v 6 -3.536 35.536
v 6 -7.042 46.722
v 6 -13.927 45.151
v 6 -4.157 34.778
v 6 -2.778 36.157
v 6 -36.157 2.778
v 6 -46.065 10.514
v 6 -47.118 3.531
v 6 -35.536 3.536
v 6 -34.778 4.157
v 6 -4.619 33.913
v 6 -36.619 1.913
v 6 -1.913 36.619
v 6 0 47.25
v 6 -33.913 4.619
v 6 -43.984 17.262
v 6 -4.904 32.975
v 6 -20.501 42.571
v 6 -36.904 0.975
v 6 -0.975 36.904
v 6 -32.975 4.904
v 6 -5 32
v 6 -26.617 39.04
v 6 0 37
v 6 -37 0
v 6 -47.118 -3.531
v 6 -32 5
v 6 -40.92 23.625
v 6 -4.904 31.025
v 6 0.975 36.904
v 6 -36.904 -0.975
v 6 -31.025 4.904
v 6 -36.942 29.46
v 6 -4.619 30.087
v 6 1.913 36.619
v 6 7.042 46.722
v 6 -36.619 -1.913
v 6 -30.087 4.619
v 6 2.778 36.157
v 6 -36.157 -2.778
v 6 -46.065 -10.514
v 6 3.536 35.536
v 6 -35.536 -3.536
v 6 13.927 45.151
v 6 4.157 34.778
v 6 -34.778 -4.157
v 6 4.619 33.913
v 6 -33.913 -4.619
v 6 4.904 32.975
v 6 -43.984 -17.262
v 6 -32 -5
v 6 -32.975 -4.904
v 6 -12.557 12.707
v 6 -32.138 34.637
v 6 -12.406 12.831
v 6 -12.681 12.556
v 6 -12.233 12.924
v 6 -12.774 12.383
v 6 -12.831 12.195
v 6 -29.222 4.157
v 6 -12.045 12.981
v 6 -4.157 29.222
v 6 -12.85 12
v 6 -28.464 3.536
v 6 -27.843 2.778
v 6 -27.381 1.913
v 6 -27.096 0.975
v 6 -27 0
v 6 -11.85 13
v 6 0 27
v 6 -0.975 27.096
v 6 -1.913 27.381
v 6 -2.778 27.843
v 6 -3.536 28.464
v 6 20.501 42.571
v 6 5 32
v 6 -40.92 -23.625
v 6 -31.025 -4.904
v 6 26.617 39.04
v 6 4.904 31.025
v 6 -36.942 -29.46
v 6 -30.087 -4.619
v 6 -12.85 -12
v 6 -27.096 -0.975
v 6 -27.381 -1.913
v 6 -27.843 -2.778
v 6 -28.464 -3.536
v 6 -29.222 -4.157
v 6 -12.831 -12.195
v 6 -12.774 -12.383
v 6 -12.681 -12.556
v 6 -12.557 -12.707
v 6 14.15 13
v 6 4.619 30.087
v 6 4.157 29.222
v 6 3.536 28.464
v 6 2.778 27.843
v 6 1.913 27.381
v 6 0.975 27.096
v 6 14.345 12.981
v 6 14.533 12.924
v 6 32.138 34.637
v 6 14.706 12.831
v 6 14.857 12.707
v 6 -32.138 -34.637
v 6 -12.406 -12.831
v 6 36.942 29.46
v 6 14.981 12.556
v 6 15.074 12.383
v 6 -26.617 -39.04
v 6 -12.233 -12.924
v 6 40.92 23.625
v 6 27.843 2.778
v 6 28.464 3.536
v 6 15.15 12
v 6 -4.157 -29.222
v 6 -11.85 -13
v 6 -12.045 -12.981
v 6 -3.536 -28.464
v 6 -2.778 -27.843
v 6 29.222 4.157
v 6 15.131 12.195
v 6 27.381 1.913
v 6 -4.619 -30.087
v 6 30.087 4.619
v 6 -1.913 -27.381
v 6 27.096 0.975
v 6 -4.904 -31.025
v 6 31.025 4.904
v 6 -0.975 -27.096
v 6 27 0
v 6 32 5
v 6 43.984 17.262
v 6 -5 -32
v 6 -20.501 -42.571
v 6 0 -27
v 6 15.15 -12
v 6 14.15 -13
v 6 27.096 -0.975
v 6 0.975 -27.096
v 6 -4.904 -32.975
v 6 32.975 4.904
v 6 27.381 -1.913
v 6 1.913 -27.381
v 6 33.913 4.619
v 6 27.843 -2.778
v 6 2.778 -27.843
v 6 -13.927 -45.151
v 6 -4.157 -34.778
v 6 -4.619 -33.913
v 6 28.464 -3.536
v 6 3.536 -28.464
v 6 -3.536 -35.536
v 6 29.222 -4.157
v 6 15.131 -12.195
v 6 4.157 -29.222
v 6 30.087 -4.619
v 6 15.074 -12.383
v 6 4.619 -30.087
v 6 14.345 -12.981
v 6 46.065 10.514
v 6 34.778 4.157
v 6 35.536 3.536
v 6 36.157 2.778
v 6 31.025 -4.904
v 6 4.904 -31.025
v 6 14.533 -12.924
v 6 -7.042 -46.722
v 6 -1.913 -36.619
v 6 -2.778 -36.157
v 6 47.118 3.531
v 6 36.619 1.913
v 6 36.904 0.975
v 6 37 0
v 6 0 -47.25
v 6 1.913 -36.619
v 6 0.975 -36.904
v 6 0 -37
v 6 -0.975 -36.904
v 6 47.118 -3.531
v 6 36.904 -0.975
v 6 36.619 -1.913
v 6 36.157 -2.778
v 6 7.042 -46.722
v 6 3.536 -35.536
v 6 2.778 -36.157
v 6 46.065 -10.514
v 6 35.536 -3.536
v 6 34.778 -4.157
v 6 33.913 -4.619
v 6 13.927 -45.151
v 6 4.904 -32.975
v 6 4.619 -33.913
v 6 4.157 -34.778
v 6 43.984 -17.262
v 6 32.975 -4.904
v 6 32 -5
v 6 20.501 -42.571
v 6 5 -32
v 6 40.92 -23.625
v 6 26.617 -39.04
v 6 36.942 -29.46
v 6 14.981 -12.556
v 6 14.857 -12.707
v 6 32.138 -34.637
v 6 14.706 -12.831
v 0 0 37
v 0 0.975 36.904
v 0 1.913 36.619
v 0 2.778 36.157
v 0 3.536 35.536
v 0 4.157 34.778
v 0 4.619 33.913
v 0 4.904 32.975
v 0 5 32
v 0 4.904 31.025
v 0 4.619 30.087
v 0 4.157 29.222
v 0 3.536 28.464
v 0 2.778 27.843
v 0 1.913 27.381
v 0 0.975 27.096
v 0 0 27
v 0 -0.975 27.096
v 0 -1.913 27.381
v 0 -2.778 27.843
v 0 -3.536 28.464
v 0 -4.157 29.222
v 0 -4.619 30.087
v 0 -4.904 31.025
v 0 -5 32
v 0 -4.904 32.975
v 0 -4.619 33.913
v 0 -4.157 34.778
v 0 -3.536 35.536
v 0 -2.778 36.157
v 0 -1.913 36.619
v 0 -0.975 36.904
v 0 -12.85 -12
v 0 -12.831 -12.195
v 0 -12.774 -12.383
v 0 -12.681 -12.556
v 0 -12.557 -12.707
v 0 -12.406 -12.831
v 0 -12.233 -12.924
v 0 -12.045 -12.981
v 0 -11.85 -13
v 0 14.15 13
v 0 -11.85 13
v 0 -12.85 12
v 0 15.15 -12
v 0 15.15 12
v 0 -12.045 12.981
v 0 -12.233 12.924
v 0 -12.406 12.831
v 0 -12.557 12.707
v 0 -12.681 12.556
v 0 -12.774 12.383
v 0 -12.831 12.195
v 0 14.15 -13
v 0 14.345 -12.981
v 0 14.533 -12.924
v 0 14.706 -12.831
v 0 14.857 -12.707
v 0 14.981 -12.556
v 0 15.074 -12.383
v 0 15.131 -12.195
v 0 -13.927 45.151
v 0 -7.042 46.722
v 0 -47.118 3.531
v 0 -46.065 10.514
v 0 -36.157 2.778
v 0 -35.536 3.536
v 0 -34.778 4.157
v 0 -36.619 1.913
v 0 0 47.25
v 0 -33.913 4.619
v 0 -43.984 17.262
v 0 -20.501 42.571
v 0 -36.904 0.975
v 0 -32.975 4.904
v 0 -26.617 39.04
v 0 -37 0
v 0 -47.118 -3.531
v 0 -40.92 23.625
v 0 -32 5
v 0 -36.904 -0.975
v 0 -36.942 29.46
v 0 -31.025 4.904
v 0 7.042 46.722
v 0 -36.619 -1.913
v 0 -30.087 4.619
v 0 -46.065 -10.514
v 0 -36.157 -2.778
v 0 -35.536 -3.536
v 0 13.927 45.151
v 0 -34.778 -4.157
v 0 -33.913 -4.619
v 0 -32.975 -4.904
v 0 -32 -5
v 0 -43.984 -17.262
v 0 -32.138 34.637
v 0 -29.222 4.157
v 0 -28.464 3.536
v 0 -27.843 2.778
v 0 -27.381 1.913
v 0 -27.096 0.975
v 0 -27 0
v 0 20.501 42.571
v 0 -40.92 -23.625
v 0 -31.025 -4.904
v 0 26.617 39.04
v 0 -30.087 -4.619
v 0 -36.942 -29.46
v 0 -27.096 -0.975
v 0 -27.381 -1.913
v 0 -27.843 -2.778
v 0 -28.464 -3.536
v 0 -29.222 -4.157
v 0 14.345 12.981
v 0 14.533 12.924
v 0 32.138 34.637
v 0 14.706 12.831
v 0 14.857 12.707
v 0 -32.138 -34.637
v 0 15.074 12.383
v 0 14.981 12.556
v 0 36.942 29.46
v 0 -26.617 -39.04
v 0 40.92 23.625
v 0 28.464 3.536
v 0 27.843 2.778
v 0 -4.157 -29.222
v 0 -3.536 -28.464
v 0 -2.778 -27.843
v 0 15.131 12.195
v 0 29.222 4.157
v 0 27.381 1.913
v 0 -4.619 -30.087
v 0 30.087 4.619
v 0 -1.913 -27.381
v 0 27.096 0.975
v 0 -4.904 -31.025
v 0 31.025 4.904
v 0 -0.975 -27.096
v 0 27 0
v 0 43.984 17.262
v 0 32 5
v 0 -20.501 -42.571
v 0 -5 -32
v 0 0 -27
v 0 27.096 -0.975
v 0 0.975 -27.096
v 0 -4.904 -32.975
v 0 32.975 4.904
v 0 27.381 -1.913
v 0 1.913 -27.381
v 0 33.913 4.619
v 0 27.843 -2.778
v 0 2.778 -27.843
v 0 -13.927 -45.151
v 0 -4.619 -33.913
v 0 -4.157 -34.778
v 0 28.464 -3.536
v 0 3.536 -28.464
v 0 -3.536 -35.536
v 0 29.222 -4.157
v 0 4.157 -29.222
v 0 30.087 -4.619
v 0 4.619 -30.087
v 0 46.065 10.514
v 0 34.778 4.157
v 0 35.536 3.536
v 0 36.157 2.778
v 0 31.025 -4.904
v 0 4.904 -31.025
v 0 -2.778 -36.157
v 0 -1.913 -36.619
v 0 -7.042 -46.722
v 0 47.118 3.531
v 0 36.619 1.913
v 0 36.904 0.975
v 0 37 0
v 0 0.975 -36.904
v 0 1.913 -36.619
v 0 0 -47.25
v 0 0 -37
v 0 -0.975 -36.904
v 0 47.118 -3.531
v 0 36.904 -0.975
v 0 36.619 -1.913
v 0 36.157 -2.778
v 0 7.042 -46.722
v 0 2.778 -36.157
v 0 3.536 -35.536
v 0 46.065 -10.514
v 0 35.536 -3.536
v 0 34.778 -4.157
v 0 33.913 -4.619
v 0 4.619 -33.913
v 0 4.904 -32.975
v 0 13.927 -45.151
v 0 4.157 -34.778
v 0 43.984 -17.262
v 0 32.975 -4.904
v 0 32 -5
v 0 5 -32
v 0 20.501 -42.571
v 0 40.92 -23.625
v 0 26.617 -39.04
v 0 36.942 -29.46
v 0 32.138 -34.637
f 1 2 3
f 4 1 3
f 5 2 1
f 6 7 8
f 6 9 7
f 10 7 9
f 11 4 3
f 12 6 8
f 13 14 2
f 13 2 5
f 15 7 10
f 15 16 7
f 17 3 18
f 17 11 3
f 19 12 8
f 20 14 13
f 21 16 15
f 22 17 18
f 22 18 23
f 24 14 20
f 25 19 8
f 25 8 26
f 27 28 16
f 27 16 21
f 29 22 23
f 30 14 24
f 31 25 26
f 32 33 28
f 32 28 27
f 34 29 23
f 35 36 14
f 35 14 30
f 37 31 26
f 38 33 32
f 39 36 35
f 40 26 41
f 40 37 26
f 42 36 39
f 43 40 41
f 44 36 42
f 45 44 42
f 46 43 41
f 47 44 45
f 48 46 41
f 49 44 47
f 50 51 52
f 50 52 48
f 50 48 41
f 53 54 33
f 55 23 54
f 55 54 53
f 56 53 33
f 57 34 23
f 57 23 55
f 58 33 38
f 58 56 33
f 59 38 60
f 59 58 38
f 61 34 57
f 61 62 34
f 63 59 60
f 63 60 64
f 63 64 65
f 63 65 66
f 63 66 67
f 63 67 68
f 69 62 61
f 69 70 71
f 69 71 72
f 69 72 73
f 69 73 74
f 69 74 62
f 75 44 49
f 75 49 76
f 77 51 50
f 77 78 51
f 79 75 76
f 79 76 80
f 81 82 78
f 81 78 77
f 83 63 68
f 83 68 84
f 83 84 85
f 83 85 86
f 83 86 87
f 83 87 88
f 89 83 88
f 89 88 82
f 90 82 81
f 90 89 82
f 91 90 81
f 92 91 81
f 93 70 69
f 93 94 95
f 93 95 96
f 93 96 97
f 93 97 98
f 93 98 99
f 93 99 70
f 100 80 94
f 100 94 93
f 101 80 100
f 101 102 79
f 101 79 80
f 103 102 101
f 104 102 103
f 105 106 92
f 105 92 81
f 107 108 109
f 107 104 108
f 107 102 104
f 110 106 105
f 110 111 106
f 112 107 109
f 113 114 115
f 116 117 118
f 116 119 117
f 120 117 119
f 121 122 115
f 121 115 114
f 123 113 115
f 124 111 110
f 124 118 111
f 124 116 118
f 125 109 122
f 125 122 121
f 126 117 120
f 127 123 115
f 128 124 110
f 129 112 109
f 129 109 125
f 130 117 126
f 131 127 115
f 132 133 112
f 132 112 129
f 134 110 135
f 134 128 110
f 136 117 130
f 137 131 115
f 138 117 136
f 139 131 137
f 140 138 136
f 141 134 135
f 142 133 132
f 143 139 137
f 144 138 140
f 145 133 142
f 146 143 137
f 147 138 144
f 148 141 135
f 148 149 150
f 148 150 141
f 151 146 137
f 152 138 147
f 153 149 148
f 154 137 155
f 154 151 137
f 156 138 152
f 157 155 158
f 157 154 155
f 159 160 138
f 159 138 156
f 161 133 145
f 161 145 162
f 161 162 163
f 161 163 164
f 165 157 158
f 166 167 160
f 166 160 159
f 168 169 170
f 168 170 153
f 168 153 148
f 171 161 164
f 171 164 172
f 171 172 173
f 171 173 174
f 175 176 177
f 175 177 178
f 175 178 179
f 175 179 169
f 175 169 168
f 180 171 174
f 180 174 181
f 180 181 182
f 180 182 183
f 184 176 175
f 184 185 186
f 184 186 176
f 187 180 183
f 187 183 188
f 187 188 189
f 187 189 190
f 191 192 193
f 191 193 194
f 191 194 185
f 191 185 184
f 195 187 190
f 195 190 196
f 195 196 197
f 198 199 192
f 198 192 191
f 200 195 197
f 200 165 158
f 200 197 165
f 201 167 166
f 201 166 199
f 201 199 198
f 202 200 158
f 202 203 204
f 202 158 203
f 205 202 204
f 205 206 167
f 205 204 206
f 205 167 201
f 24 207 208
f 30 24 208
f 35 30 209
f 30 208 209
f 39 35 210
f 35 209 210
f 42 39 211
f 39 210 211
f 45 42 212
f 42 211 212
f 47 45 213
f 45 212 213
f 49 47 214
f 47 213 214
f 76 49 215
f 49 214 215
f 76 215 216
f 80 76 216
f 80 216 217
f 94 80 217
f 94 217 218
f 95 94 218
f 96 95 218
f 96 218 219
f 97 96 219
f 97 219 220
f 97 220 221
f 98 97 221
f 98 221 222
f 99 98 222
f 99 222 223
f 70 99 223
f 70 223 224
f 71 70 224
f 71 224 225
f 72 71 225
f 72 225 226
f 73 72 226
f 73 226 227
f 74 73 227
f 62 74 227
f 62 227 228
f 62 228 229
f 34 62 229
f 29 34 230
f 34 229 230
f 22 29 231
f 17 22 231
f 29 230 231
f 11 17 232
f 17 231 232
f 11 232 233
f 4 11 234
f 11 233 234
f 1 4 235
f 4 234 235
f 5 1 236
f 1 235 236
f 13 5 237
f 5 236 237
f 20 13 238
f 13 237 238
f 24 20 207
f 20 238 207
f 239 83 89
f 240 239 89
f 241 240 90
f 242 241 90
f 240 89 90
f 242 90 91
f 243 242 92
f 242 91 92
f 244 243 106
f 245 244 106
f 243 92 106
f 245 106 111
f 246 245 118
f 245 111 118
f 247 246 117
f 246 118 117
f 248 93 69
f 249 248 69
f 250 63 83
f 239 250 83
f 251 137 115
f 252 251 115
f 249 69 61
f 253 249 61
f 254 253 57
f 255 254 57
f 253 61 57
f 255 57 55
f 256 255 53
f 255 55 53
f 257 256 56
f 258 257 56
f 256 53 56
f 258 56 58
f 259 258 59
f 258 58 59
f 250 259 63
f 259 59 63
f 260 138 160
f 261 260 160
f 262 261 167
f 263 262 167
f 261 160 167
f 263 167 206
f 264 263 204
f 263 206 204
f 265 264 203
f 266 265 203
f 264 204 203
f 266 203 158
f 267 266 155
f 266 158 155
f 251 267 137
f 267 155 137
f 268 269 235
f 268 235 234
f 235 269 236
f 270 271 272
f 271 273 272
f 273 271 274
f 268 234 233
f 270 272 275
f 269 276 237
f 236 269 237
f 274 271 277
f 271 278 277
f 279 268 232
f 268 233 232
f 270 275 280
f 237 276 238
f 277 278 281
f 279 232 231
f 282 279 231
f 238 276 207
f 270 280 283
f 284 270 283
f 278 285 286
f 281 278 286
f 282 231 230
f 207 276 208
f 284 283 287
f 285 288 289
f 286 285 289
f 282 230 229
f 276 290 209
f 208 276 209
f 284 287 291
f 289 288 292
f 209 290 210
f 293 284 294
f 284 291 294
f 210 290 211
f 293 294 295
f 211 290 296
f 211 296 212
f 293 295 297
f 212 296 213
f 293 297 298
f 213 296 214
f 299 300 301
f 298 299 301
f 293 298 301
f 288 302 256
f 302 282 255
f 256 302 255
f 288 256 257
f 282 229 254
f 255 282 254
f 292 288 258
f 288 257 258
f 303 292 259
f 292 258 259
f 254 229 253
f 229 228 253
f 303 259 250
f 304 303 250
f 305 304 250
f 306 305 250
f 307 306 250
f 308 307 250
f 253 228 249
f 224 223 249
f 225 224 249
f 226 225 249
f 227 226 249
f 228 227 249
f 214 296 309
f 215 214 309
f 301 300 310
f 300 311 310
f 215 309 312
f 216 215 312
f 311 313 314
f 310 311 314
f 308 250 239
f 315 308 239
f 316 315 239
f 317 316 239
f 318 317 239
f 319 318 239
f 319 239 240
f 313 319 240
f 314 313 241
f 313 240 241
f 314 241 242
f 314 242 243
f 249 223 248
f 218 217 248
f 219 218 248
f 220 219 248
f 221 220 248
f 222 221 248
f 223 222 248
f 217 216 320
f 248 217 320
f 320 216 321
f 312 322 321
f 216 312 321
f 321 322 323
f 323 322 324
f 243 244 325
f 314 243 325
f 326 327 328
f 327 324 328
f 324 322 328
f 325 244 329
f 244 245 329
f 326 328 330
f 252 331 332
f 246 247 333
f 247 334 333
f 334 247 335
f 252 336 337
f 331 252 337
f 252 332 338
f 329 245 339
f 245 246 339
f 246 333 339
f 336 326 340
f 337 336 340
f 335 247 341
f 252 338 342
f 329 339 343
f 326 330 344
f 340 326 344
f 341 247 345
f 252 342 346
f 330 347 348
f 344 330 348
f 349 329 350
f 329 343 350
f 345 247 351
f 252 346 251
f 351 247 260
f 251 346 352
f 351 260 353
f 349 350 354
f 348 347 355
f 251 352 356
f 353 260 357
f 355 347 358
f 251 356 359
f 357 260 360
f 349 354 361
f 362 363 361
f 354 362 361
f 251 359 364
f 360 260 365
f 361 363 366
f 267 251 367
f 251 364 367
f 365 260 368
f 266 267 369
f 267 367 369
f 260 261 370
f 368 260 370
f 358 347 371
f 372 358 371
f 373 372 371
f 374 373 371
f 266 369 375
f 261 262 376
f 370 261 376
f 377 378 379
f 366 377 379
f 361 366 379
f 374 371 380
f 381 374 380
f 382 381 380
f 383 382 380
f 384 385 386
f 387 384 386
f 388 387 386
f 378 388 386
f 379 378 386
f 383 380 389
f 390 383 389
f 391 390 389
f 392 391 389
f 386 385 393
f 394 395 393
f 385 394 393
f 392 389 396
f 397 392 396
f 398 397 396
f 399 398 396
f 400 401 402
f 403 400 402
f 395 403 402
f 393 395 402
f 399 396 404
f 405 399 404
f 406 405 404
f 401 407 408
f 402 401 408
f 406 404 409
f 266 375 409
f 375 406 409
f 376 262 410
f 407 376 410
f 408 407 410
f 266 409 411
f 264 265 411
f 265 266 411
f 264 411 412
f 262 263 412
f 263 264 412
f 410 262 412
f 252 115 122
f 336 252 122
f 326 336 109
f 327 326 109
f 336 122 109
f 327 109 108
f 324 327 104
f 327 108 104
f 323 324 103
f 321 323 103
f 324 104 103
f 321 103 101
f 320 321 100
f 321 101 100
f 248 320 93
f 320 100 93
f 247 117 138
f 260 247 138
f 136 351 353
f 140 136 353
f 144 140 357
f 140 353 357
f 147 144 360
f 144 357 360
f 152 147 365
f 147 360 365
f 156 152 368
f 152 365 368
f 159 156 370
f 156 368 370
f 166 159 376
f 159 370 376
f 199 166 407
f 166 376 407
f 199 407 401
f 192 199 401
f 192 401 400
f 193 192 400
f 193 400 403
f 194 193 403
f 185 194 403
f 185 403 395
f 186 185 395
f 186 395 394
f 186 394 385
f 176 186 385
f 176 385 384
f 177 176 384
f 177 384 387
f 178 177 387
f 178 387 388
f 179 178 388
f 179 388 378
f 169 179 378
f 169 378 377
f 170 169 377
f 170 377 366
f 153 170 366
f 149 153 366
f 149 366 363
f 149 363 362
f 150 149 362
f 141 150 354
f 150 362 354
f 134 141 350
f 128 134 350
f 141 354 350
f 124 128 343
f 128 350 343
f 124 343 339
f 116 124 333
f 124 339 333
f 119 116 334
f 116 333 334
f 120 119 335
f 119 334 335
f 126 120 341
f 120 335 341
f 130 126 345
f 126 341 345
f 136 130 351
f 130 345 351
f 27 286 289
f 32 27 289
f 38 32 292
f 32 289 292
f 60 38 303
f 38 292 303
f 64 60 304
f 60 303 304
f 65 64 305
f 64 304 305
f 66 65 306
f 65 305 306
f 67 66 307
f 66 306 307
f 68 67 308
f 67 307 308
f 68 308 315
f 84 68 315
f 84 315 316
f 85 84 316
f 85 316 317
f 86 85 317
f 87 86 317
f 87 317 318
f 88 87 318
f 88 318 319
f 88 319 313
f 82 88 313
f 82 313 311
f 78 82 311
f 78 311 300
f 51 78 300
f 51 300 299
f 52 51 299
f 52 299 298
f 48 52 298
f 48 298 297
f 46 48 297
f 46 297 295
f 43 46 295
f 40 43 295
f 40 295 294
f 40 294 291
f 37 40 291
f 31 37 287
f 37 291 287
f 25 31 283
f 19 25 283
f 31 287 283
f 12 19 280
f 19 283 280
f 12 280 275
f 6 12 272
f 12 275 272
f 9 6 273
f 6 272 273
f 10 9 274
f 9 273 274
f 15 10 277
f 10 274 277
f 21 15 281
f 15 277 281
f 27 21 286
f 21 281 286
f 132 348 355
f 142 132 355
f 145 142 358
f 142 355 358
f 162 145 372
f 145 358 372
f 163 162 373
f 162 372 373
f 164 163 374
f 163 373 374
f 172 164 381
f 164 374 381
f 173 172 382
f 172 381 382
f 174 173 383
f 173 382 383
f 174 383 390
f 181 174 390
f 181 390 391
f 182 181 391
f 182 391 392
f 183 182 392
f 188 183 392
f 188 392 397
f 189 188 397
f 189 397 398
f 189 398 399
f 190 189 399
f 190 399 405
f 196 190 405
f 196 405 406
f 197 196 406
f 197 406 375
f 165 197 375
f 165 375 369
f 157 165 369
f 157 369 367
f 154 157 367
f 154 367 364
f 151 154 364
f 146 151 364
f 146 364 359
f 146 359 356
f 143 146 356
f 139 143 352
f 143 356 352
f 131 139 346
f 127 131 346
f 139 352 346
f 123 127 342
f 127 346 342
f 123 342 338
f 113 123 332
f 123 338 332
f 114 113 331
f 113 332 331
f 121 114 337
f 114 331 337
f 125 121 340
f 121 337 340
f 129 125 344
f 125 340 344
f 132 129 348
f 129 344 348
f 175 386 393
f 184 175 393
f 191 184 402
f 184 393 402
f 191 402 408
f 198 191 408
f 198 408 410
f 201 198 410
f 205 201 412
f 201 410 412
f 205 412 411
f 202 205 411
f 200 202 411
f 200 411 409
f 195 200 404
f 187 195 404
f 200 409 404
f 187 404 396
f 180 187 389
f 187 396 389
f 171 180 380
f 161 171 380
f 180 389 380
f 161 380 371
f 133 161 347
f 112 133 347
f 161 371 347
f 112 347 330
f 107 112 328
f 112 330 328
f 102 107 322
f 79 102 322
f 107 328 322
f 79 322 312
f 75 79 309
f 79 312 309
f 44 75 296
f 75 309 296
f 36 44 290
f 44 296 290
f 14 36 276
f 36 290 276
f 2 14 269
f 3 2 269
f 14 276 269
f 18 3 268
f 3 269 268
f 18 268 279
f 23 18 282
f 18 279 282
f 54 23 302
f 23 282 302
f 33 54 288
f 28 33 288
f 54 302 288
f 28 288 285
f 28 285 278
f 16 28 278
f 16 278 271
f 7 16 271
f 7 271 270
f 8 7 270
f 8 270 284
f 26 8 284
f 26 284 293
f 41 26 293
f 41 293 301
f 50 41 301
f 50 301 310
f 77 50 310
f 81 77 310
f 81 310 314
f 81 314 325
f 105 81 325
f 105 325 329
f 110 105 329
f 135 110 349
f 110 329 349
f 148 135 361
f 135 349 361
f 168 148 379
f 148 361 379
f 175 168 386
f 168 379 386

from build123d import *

# Parameters (mm, degrees)
SKETCH1_R                                           = 47.25
BOSS_EXTRUDE1_DEPTH                                 = 6
CUT_EXTRUDE1_DEPTH                                  = 20
CBORE_FOR_M5_HEX_SOCKET_HEAD_CAP_SCREW2_D           = 5.3
CBORE_FOR_M5_HEX_SOCKET_HEAD_CAP_SCREW2_DEPTH       = 20
CBORE_FOR_M5_HEX_SOCKET_HEAD_CAP_SCREW2_CBORE_D     = 10
CBORE_FOR_M5_HEX_SOCKET_HEAD_CAP_SCREW2_CBORE_DEPTH = 15.4
CBORE_FOR_M5_HEX_SOCKET_HEAD_CAP_SCREW2_TIP         = 1.59228064


with BuildPart() as part:
    # Sketch1 → Boss-Extrude1 (new body)
    with BuildSketch(Plane(origin=(0, 0, 0), x_dir=(0, 0, -1), z_dir=(1, 0, 0))):
        Circle(SKETCH1_R)
    extrude(amount=BOSS_EXTRUDE1_DEPTH)

    # Sketch2 → Cut-Extrude1 (cut)
    with BuildSketch(Plane(origin=(6, 0, 0), x_dir=(0, 0, -1), z_dir=(1, 0, 0))):
        with BuildLine():
            Line((-12, -12.85), (12, -12.85))
            ThreePointArc((12, -12.85), (12.707106781, -12.557106781), (13, -11.85))
            Line((13, -11.85), (13, 14.15))
            ThreePointArc((13, 14.15), (12.707106781, 14.857106781), (12, 15.15))
            Line((12, 15.15), (-12, 15.15))
            ThreePointArc((-12, 15.15), (-12.707106781, 14.857106781), (-13, 14.15))
            Line((-13, 14.15), (-13, -11.85))
            ThreePointArc((-13, -11.85), (-12.707106781, -12.557106781), (-12, -12.85))
        make_face()
    extrude(amount=-CUT_EXTRUDE1_DEPTH, mode=Mode.SUBTRACT)

    # CBORE for M5 Hex Socket Head Cap Screw2
    with Locations(Plane.ZY):
        with Locations((-32, 0), (0, 32), (32, 0), (0, -32)):
            CounterBoreHole(CBORE_FOR_M5_HEX_SOCKET_HEAD_CAP_SCREW2_D / 2, CBORE_FOR_M5_HEX_SOCKET_HEAD_CAP_SCREW2_CBORE_D / 2, CBORE_FOR_M5_HEX_SOCKET_HEAD_CAP_SCREW2_CBORE_DEPTH, depth=CBORE_FOR_M5_HEX_SOCKET_HEAD_CAP_SCREW2_DEPTH)
            with Locations((0, 0, -(CBORE_FOR_M5_HEX_SOCKET_HEAD_CAP_SCREW2_DEPTH + CBORE_FOR_M5_HEX_SOCKET_HEAD_CAP_SCREW2_TIP / 2))):  # 118° drill point
                Cone(0, CBORE_FOR_M5_HEX_SOCKET_HEAD_CAP_SCREW2_D / 2, CBORE_FOR_M5_HEX_SOCKET_HEAD_CAP_SCREW2_TIP, mode=Mode.SUBTRACT)


solid = part.part
